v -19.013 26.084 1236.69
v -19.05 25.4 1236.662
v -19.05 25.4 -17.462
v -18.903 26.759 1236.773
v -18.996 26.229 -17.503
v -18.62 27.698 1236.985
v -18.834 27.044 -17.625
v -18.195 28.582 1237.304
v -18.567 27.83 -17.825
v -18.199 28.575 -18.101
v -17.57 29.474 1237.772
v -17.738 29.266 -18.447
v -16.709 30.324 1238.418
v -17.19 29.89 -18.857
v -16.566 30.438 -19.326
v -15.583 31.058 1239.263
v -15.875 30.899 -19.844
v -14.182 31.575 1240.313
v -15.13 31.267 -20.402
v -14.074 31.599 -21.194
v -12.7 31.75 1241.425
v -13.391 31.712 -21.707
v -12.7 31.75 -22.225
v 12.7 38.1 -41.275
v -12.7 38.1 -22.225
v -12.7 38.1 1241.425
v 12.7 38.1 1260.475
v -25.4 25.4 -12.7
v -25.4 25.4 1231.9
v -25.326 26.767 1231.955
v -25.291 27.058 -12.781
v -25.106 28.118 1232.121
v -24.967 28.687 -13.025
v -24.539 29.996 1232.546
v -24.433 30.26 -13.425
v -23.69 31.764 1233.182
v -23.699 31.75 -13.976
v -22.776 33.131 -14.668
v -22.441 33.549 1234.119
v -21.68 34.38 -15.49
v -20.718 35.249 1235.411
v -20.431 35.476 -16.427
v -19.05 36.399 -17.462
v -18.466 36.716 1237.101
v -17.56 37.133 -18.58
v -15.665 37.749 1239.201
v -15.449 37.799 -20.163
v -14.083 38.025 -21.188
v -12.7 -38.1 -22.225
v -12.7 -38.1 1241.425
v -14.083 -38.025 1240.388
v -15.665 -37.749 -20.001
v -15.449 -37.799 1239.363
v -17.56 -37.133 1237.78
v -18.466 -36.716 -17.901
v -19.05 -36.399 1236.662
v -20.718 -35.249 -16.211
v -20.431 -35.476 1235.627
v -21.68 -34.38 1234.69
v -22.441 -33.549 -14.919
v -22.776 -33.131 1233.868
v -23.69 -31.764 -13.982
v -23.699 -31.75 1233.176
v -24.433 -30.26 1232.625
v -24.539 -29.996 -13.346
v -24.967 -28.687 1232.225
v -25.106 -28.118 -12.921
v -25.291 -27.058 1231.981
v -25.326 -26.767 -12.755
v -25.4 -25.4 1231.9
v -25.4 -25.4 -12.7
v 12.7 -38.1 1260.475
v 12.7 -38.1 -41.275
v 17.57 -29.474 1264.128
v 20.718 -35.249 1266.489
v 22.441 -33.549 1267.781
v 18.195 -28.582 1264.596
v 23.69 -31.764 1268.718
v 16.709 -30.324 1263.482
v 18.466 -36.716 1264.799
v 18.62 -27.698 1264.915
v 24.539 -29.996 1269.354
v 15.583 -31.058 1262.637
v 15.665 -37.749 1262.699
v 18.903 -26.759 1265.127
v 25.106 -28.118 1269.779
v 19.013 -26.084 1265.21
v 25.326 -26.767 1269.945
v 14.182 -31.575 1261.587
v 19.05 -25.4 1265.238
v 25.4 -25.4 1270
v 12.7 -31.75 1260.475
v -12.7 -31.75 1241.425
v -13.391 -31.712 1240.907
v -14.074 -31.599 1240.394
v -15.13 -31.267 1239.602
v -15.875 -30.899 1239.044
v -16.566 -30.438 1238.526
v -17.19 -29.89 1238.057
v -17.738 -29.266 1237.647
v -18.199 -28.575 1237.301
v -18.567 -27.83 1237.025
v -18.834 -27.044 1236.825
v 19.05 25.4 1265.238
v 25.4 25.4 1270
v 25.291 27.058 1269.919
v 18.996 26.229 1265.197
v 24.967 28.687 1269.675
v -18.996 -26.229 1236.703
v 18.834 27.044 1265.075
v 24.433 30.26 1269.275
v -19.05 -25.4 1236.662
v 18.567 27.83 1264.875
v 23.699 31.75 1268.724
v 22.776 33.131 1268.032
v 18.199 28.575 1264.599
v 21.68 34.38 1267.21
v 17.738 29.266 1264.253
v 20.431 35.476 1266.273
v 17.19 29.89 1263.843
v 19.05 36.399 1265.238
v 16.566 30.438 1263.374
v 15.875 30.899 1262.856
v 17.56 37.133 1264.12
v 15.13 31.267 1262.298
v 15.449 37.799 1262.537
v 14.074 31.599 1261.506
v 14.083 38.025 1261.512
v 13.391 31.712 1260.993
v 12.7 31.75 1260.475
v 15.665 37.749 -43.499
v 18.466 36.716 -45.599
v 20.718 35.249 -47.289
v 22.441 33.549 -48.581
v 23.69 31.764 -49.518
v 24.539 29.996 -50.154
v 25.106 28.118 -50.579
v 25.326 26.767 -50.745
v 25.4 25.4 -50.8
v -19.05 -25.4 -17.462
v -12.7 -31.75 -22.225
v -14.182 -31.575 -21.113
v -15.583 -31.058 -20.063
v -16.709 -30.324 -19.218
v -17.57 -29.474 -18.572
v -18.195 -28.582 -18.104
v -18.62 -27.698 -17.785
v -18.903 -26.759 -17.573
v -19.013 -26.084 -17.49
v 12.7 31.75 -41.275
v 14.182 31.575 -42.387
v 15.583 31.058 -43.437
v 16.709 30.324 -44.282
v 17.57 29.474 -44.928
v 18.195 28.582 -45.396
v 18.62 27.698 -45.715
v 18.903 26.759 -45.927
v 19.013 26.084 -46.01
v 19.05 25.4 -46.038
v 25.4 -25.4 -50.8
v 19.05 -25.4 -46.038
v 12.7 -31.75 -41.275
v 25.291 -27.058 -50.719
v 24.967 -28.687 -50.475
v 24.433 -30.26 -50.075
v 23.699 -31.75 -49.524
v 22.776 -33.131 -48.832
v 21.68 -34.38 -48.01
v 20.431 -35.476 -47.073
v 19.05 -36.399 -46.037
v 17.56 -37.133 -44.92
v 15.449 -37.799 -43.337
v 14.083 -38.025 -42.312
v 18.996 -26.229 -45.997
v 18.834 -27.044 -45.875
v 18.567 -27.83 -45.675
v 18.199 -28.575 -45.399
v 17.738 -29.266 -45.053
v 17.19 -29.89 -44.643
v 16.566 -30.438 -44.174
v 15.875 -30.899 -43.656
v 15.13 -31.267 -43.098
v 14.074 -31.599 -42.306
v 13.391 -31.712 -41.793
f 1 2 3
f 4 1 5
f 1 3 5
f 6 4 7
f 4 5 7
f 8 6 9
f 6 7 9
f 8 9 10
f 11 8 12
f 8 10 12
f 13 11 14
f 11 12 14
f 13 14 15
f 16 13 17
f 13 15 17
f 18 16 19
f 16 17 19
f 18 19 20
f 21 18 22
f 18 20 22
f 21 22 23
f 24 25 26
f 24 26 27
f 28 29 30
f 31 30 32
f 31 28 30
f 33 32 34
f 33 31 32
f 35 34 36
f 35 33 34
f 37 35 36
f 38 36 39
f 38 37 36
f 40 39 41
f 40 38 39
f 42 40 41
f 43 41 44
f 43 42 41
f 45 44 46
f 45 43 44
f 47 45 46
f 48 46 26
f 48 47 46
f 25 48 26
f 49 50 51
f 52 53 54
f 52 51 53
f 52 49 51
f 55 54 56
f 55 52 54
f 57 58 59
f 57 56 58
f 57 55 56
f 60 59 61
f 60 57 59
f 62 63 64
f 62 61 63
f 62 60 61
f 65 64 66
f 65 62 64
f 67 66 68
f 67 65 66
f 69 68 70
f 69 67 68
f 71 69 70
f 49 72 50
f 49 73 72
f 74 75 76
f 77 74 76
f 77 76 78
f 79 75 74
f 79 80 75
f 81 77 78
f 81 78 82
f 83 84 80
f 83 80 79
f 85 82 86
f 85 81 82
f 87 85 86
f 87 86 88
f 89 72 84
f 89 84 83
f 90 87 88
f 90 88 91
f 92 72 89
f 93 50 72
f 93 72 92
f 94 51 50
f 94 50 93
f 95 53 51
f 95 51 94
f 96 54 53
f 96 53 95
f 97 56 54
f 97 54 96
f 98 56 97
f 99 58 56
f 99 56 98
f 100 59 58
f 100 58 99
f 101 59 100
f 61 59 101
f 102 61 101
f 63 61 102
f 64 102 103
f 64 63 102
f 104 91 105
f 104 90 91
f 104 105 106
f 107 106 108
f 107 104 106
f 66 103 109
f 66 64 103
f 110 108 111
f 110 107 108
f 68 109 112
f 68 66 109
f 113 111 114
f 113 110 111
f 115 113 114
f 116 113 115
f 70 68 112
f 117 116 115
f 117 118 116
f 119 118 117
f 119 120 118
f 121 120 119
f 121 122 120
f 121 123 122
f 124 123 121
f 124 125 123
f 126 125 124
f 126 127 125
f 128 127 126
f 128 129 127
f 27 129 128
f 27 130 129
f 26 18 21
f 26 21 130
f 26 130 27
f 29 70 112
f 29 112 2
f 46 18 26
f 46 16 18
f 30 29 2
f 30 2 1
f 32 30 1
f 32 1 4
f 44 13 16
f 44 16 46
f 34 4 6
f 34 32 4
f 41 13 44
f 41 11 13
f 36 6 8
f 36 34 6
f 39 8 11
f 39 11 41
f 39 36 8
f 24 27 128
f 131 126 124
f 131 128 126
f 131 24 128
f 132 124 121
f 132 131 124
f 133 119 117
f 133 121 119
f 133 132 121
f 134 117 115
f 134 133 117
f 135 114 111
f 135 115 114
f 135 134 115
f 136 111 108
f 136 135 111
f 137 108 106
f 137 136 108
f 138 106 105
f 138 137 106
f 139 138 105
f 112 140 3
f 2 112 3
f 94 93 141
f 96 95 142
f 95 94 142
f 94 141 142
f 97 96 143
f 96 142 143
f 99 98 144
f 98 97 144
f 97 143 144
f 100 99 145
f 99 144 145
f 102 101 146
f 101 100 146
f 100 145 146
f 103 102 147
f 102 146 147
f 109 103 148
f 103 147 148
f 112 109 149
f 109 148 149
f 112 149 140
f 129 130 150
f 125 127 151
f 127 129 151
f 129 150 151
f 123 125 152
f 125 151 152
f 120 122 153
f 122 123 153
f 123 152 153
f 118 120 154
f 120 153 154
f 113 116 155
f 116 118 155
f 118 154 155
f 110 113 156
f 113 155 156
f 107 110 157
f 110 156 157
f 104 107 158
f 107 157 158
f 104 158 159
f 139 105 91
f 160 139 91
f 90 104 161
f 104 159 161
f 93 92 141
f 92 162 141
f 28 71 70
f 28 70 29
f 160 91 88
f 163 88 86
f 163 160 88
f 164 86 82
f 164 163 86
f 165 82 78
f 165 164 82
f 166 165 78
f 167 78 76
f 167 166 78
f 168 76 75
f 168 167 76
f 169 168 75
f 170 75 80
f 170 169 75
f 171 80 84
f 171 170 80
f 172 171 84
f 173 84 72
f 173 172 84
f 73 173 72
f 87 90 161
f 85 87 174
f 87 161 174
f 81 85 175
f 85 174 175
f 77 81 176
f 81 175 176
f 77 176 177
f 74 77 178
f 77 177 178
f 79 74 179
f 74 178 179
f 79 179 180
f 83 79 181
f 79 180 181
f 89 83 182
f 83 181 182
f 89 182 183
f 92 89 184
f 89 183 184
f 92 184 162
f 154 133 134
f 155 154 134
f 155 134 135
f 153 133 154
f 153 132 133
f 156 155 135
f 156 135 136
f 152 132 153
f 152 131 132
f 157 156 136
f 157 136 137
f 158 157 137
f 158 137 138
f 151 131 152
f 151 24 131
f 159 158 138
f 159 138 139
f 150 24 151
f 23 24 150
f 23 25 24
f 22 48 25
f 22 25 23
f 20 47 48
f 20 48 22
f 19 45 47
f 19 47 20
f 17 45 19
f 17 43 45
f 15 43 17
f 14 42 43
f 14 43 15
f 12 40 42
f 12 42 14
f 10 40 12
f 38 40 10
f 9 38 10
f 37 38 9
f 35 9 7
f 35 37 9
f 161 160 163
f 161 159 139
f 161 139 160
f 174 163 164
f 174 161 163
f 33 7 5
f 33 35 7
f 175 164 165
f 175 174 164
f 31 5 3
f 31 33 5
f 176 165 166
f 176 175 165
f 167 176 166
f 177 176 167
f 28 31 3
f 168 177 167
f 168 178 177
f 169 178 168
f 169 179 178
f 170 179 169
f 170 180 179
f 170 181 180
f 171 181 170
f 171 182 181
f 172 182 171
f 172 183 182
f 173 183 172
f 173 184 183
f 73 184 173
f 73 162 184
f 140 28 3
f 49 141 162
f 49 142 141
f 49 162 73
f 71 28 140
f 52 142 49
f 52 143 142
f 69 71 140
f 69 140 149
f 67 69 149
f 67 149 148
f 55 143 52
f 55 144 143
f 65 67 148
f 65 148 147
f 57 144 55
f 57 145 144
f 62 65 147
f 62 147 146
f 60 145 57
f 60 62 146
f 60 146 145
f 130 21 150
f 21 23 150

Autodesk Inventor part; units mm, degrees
ref_plane "Start Plane" through (0, 0, -50.8) normal (0, 0, 1) x (1, 0, 0)
ref_plane "End Plane" through (0, 0, 1270) normal (0, 0, 1) x (1, 0, 0)
sketch "Sketch" plane through (0, 0, 0) normal (0, 0, 1) x (1, 0, 0)
  line L0 (-25.4, -25.4) -> (-25.4, 25.4)
  line L1 (-12.7, 38.1) -> (12.7, 38.1)
  line L2 (25.4, 25.4) -> (25.4, -25.4)
  line L3 (12.7, -38.1) -> (-12.7, -38.1)
  arc A0 (-25.4, -25.4) -> (-12.7, -38.1) centre (-12.7, -25.4) ccw
  arc A1 (-12.7, 38.1) -> (-25.4, 25.4) centre (-12.7, 25.4) ccw
  arc A2 (25.4, 25.4) -> (12.7, 38.1) centre (12.7, 25.4) ccw
  arc A3 (12.7, -38.1) -> (25.4, -25.4) centre (12.7, -25.4) ccw
  arc A4 (-12.7, 31.75) -> (-19.05, 25.4) centre (-12.7, 25.4) ccw
  line L4 (-12.7, 31.75) -> (12.7, 31.75)
  arc A5 (19.05, 25.4) -> (12.7, 31.75) centre (12.7, 25.4) ccw
  line L5 (19.05, 25.4) -> (19.05, -25.4)
  arc A6 (12.7, -31.75) -> (19.05, -25.4) centre (12.7, -25.4) ccw
  line L6 (12.7, -31.75) -> (-12.7, -31.75)
  arc A7 (-19.05, -25.4) -> (-12.7, -31.75) centre (-12.7, -25.4) ccw
  line L7 (-19.05, -25.4) -> (-19.05, 25.4)
  line L8 (0, 57.0224) -> (0, -57.0224) construction
  line L9 (-39.2424, 0) -> (39.2424, 0) construction
  dimension "d10" = 76.2
  dimension "d11" = 50.8
  dimension "d12" = 6.35
  dimension "d15" = 38.1
  dimension "d16" = 25.4
  dimension "d17" = 12.7
extrude "Body" add sketch "Sketch" along normal up to surface (1320.8 mm away) from surface at -50.8
sketch "Sketch3" plane through (0, 0, 0) normal (0, 0, 1) x (1, 0, 0)
  line L0 (0, 0) -> (10, 0)
ref_plane "Work Plane3" through (0, 0, 0) normal (0, -1, 0) x (1, 0, 0)
ref_plane "Work Plane4" through (-15.24, 0, 1239.52) normal (-0.6, 0, 0.8) x (0.8, 0, 0.6)
split "Split1" plane through (-15.24, 0, 1239.52) removes the side toward (-0.6, 0, 0.8)
ref_plane "Work Plane5" through (-421.64, 0, 284.48) normal (-0.6, 0, -0.8) x (-0.8, 0, 0.6)
split "Split2" plane through (-421.64, 0, 284.48) removes the side toward (-0.6, 0, -0.8)
sketch "Sketch4" plane through (0, 0, 0) normal (0, -1, 0) x (1, 0, 0)
  line L0 (-2, -50.8) -> (12, -50.8) projected
  line L1 (-2, 1270) -> (12, 1270) projected
  dimension "d19" = 1320.8
equation "\"d10\" = G_H"
equation "\"d11\" = G_W"
equation "\"d12\" = G_T"
equation "\"d15\" = 0.5 * d10"
equation "\"d16\" = 0.5 * d11"
equation "\"d17\" = G_IR"
equation "\"d3\" = G_L"
equation "\"G_W\" = 50.8"
equation "\"G_H\" = 76.2"
equation "\"G_T\" = 6.35"
equation "\"G_IR\" = 12.7"
equation "\"G_L\" = d19"
equation "\"G_OFFSET_START\" = 50.8"
equation "\"G_OFFSET_END\" = 50.8"
equation "\"d13\" = -G_OFFSET_START"
equation "\"B_L\" = 1219.2"
properties part number "AISC - 3 x 2 x 1/4 - 52" material "Steel, Mild"
